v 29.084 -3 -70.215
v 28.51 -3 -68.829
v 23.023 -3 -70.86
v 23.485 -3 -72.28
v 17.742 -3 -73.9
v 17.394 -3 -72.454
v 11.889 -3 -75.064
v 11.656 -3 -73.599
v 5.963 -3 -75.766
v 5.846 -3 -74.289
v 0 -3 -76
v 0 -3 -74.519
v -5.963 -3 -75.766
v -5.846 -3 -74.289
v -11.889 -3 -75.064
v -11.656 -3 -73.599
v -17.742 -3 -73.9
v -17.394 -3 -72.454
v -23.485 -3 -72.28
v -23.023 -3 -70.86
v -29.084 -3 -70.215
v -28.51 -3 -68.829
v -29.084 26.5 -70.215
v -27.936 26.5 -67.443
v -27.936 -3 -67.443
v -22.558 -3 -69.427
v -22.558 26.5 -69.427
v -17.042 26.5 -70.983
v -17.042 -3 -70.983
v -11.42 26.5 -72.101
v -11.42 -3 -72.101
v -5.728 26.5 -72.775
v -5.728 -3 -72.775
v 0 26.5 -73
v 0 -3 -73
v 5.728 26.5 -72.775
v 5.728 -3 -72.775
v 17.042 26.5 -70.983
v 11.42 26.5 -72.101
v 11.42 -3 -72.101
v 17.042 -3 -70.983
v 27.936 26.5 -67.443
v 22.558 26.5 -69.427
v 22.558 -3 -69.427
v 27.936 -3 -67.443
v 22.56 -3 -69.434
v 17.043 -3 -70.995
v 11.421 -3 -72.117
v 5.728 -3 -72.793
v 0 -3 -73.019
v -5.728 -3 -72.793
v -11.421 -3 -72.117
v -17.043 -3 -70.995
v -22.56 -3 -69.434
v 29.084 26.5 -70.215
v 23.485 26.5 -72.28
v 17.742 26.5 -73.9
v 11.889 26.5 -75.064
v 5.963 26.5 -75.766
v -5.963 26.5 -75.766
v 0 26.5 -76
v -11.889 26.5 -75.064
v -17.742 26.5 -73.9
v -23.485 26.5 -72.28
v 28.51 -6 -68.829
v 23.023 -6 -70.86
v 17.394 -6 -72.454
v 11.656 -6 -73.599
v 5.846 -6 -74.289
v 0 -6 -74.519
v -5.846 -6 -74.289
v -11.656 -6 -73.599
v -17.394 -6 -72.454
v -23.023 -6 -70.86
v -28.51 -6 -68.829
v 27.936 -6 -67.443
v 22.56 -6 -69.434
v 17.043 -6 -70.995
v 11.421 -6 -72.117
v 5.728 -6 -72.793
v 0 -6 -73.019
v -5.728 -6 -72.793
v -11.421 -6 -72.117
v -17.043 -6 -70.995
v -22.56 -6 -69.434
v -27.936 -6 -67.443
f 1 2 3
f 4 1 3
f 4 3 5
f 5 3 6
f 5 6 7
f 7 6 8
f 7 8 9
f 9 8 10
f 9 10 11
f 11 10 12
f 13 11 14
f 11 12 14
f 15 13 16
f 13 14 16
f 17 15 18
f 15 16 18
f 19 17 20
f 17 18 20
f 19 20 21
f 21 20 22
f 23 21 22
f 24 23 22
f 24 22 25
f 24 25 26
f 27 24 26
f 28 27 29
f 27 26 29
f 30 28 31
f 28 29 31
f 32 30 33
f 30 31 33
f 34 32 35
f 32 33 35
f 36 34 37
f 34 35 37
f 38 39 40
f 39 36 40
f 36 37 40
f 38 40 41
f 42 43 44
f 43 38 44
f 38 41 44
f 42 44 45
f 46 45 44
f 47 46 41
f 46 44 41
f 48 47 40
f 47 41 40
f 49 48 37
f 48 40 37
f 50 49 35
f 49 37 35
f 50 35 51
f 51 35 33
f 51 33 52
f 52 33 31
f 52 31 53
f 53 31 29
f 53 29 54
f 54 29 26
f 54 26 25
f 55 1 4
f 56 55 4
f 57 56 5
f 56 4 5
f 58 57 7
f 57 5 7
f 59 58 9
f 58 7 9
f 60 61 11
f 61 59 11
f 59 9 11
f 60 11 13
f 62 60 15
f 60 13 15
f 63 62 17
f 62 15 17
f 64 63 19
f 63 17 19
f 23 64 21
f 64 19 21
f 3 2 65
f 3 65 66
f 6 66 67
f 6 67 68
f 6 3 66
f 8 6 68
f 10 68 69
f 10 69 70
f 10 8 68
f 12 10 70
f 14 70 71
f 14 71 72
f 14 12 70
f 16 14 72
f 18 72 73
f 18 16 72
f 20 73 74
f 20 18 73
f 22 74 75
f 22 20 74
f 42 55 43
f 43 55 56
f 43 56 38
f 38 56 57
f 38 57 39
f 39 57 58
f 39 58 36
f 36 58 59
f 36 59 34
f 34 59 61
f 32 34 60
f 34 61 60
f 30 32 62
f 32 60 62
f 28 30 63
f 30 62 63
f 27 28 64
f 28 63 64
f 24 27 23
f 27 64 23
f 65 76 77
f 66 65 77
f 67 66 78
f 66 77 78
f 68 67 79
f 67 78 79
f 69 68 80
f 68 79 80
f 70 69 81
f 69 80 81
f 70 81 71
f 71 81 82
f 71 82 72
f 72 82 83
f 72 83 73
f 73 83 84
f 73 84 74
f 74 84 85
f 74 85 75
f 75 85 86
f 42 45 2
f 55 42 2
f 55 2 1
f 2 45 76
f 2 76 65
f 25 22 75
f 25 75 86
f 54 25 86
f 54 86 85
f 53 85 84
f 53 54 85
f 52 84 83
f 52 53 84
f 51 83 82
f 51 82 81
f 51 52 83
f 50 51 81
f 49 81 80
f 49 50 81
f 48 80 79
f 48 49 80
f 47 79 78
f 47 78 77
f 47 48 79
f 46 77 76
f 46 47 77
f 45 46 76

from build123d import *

# Parameters (mm, degrees)
BOSS_EXTRUDE1_DEPTH = 26.5
BOSS_EXTRUDE2_START = 3
BOSS_EXTRUDE2_DEPTH = 3
BOSS_EXTRUDE3_DEPTH = 3


with BuildPart() as part:
    # Sketch1 → Boss-Extrude1 (new body)
    with BuildSketch(Plane(origin=(0, 0, 0), x_dir=(1, 0, 0), z_dir=(0, 1, 0))):
        with BuildLine():
            Line((29.08394086, 70.214844471), (27.935890563, 67.443205873))
            ThreePointArc((27.935890563, 67.443205873), (0, 73), (-27.935890563, 67.443205873))
            Line((-27.935890563, 67.443205873), (-29.08394086, 70.214844471))
            ThreePointArc((-29.08394086, 70.214844471), (0, 76), (29.08394086, 70.214844471))
        make_face()
    extrude(amount=BOSS_EXTRUDE1_DEPTH)

    # Sketch2 → Boss-Extrude2 (add)
    with BuildSketch(Plane.XZ.offset(BOSS_EXTRUDE2_START)):
        with BuildLine():
            Line((27.935890563, -67.443205873), (29.08394086, -70.214844471))
            ThreePointArc((29.08394086, -70.214844471), (0, -76), (-29.08394086, -70.214844471))
            Line((-29.08394086, -70.214844471), (-27.935890563, -67.443205873))
            ThreePointArc((-27.935890563, -67.443205873), (0, -73), (27.935890563, -67.443205873))
        make_face()
    extrude(amount=-BOSS_EXTRUDE2_DEPTH)

    # Sketch3 → Boss-Extrude3 (add)
    with BuildSketch(Plane.XZ.offset(3)):
        with BuildLine():
            Line((27.935890563, -67.443205873), (28.509915711, -68.829025172))
            ThreePointArc((28.509915711, -68.829025172), (0, -74.519275475), (-28.509915711, -68.829025172))
            Line((-28.509915711, -68.829025172), (-27.935890563, -67.443205873))
            ThreePointArc((-27.935890563, -67.443205873), (0, -73.019276769), (27.935890563, -67.443205873))
        make_face()
    extrude(amount=BOSS_EXTRUDE3_DEPTH)


solid = part.part
